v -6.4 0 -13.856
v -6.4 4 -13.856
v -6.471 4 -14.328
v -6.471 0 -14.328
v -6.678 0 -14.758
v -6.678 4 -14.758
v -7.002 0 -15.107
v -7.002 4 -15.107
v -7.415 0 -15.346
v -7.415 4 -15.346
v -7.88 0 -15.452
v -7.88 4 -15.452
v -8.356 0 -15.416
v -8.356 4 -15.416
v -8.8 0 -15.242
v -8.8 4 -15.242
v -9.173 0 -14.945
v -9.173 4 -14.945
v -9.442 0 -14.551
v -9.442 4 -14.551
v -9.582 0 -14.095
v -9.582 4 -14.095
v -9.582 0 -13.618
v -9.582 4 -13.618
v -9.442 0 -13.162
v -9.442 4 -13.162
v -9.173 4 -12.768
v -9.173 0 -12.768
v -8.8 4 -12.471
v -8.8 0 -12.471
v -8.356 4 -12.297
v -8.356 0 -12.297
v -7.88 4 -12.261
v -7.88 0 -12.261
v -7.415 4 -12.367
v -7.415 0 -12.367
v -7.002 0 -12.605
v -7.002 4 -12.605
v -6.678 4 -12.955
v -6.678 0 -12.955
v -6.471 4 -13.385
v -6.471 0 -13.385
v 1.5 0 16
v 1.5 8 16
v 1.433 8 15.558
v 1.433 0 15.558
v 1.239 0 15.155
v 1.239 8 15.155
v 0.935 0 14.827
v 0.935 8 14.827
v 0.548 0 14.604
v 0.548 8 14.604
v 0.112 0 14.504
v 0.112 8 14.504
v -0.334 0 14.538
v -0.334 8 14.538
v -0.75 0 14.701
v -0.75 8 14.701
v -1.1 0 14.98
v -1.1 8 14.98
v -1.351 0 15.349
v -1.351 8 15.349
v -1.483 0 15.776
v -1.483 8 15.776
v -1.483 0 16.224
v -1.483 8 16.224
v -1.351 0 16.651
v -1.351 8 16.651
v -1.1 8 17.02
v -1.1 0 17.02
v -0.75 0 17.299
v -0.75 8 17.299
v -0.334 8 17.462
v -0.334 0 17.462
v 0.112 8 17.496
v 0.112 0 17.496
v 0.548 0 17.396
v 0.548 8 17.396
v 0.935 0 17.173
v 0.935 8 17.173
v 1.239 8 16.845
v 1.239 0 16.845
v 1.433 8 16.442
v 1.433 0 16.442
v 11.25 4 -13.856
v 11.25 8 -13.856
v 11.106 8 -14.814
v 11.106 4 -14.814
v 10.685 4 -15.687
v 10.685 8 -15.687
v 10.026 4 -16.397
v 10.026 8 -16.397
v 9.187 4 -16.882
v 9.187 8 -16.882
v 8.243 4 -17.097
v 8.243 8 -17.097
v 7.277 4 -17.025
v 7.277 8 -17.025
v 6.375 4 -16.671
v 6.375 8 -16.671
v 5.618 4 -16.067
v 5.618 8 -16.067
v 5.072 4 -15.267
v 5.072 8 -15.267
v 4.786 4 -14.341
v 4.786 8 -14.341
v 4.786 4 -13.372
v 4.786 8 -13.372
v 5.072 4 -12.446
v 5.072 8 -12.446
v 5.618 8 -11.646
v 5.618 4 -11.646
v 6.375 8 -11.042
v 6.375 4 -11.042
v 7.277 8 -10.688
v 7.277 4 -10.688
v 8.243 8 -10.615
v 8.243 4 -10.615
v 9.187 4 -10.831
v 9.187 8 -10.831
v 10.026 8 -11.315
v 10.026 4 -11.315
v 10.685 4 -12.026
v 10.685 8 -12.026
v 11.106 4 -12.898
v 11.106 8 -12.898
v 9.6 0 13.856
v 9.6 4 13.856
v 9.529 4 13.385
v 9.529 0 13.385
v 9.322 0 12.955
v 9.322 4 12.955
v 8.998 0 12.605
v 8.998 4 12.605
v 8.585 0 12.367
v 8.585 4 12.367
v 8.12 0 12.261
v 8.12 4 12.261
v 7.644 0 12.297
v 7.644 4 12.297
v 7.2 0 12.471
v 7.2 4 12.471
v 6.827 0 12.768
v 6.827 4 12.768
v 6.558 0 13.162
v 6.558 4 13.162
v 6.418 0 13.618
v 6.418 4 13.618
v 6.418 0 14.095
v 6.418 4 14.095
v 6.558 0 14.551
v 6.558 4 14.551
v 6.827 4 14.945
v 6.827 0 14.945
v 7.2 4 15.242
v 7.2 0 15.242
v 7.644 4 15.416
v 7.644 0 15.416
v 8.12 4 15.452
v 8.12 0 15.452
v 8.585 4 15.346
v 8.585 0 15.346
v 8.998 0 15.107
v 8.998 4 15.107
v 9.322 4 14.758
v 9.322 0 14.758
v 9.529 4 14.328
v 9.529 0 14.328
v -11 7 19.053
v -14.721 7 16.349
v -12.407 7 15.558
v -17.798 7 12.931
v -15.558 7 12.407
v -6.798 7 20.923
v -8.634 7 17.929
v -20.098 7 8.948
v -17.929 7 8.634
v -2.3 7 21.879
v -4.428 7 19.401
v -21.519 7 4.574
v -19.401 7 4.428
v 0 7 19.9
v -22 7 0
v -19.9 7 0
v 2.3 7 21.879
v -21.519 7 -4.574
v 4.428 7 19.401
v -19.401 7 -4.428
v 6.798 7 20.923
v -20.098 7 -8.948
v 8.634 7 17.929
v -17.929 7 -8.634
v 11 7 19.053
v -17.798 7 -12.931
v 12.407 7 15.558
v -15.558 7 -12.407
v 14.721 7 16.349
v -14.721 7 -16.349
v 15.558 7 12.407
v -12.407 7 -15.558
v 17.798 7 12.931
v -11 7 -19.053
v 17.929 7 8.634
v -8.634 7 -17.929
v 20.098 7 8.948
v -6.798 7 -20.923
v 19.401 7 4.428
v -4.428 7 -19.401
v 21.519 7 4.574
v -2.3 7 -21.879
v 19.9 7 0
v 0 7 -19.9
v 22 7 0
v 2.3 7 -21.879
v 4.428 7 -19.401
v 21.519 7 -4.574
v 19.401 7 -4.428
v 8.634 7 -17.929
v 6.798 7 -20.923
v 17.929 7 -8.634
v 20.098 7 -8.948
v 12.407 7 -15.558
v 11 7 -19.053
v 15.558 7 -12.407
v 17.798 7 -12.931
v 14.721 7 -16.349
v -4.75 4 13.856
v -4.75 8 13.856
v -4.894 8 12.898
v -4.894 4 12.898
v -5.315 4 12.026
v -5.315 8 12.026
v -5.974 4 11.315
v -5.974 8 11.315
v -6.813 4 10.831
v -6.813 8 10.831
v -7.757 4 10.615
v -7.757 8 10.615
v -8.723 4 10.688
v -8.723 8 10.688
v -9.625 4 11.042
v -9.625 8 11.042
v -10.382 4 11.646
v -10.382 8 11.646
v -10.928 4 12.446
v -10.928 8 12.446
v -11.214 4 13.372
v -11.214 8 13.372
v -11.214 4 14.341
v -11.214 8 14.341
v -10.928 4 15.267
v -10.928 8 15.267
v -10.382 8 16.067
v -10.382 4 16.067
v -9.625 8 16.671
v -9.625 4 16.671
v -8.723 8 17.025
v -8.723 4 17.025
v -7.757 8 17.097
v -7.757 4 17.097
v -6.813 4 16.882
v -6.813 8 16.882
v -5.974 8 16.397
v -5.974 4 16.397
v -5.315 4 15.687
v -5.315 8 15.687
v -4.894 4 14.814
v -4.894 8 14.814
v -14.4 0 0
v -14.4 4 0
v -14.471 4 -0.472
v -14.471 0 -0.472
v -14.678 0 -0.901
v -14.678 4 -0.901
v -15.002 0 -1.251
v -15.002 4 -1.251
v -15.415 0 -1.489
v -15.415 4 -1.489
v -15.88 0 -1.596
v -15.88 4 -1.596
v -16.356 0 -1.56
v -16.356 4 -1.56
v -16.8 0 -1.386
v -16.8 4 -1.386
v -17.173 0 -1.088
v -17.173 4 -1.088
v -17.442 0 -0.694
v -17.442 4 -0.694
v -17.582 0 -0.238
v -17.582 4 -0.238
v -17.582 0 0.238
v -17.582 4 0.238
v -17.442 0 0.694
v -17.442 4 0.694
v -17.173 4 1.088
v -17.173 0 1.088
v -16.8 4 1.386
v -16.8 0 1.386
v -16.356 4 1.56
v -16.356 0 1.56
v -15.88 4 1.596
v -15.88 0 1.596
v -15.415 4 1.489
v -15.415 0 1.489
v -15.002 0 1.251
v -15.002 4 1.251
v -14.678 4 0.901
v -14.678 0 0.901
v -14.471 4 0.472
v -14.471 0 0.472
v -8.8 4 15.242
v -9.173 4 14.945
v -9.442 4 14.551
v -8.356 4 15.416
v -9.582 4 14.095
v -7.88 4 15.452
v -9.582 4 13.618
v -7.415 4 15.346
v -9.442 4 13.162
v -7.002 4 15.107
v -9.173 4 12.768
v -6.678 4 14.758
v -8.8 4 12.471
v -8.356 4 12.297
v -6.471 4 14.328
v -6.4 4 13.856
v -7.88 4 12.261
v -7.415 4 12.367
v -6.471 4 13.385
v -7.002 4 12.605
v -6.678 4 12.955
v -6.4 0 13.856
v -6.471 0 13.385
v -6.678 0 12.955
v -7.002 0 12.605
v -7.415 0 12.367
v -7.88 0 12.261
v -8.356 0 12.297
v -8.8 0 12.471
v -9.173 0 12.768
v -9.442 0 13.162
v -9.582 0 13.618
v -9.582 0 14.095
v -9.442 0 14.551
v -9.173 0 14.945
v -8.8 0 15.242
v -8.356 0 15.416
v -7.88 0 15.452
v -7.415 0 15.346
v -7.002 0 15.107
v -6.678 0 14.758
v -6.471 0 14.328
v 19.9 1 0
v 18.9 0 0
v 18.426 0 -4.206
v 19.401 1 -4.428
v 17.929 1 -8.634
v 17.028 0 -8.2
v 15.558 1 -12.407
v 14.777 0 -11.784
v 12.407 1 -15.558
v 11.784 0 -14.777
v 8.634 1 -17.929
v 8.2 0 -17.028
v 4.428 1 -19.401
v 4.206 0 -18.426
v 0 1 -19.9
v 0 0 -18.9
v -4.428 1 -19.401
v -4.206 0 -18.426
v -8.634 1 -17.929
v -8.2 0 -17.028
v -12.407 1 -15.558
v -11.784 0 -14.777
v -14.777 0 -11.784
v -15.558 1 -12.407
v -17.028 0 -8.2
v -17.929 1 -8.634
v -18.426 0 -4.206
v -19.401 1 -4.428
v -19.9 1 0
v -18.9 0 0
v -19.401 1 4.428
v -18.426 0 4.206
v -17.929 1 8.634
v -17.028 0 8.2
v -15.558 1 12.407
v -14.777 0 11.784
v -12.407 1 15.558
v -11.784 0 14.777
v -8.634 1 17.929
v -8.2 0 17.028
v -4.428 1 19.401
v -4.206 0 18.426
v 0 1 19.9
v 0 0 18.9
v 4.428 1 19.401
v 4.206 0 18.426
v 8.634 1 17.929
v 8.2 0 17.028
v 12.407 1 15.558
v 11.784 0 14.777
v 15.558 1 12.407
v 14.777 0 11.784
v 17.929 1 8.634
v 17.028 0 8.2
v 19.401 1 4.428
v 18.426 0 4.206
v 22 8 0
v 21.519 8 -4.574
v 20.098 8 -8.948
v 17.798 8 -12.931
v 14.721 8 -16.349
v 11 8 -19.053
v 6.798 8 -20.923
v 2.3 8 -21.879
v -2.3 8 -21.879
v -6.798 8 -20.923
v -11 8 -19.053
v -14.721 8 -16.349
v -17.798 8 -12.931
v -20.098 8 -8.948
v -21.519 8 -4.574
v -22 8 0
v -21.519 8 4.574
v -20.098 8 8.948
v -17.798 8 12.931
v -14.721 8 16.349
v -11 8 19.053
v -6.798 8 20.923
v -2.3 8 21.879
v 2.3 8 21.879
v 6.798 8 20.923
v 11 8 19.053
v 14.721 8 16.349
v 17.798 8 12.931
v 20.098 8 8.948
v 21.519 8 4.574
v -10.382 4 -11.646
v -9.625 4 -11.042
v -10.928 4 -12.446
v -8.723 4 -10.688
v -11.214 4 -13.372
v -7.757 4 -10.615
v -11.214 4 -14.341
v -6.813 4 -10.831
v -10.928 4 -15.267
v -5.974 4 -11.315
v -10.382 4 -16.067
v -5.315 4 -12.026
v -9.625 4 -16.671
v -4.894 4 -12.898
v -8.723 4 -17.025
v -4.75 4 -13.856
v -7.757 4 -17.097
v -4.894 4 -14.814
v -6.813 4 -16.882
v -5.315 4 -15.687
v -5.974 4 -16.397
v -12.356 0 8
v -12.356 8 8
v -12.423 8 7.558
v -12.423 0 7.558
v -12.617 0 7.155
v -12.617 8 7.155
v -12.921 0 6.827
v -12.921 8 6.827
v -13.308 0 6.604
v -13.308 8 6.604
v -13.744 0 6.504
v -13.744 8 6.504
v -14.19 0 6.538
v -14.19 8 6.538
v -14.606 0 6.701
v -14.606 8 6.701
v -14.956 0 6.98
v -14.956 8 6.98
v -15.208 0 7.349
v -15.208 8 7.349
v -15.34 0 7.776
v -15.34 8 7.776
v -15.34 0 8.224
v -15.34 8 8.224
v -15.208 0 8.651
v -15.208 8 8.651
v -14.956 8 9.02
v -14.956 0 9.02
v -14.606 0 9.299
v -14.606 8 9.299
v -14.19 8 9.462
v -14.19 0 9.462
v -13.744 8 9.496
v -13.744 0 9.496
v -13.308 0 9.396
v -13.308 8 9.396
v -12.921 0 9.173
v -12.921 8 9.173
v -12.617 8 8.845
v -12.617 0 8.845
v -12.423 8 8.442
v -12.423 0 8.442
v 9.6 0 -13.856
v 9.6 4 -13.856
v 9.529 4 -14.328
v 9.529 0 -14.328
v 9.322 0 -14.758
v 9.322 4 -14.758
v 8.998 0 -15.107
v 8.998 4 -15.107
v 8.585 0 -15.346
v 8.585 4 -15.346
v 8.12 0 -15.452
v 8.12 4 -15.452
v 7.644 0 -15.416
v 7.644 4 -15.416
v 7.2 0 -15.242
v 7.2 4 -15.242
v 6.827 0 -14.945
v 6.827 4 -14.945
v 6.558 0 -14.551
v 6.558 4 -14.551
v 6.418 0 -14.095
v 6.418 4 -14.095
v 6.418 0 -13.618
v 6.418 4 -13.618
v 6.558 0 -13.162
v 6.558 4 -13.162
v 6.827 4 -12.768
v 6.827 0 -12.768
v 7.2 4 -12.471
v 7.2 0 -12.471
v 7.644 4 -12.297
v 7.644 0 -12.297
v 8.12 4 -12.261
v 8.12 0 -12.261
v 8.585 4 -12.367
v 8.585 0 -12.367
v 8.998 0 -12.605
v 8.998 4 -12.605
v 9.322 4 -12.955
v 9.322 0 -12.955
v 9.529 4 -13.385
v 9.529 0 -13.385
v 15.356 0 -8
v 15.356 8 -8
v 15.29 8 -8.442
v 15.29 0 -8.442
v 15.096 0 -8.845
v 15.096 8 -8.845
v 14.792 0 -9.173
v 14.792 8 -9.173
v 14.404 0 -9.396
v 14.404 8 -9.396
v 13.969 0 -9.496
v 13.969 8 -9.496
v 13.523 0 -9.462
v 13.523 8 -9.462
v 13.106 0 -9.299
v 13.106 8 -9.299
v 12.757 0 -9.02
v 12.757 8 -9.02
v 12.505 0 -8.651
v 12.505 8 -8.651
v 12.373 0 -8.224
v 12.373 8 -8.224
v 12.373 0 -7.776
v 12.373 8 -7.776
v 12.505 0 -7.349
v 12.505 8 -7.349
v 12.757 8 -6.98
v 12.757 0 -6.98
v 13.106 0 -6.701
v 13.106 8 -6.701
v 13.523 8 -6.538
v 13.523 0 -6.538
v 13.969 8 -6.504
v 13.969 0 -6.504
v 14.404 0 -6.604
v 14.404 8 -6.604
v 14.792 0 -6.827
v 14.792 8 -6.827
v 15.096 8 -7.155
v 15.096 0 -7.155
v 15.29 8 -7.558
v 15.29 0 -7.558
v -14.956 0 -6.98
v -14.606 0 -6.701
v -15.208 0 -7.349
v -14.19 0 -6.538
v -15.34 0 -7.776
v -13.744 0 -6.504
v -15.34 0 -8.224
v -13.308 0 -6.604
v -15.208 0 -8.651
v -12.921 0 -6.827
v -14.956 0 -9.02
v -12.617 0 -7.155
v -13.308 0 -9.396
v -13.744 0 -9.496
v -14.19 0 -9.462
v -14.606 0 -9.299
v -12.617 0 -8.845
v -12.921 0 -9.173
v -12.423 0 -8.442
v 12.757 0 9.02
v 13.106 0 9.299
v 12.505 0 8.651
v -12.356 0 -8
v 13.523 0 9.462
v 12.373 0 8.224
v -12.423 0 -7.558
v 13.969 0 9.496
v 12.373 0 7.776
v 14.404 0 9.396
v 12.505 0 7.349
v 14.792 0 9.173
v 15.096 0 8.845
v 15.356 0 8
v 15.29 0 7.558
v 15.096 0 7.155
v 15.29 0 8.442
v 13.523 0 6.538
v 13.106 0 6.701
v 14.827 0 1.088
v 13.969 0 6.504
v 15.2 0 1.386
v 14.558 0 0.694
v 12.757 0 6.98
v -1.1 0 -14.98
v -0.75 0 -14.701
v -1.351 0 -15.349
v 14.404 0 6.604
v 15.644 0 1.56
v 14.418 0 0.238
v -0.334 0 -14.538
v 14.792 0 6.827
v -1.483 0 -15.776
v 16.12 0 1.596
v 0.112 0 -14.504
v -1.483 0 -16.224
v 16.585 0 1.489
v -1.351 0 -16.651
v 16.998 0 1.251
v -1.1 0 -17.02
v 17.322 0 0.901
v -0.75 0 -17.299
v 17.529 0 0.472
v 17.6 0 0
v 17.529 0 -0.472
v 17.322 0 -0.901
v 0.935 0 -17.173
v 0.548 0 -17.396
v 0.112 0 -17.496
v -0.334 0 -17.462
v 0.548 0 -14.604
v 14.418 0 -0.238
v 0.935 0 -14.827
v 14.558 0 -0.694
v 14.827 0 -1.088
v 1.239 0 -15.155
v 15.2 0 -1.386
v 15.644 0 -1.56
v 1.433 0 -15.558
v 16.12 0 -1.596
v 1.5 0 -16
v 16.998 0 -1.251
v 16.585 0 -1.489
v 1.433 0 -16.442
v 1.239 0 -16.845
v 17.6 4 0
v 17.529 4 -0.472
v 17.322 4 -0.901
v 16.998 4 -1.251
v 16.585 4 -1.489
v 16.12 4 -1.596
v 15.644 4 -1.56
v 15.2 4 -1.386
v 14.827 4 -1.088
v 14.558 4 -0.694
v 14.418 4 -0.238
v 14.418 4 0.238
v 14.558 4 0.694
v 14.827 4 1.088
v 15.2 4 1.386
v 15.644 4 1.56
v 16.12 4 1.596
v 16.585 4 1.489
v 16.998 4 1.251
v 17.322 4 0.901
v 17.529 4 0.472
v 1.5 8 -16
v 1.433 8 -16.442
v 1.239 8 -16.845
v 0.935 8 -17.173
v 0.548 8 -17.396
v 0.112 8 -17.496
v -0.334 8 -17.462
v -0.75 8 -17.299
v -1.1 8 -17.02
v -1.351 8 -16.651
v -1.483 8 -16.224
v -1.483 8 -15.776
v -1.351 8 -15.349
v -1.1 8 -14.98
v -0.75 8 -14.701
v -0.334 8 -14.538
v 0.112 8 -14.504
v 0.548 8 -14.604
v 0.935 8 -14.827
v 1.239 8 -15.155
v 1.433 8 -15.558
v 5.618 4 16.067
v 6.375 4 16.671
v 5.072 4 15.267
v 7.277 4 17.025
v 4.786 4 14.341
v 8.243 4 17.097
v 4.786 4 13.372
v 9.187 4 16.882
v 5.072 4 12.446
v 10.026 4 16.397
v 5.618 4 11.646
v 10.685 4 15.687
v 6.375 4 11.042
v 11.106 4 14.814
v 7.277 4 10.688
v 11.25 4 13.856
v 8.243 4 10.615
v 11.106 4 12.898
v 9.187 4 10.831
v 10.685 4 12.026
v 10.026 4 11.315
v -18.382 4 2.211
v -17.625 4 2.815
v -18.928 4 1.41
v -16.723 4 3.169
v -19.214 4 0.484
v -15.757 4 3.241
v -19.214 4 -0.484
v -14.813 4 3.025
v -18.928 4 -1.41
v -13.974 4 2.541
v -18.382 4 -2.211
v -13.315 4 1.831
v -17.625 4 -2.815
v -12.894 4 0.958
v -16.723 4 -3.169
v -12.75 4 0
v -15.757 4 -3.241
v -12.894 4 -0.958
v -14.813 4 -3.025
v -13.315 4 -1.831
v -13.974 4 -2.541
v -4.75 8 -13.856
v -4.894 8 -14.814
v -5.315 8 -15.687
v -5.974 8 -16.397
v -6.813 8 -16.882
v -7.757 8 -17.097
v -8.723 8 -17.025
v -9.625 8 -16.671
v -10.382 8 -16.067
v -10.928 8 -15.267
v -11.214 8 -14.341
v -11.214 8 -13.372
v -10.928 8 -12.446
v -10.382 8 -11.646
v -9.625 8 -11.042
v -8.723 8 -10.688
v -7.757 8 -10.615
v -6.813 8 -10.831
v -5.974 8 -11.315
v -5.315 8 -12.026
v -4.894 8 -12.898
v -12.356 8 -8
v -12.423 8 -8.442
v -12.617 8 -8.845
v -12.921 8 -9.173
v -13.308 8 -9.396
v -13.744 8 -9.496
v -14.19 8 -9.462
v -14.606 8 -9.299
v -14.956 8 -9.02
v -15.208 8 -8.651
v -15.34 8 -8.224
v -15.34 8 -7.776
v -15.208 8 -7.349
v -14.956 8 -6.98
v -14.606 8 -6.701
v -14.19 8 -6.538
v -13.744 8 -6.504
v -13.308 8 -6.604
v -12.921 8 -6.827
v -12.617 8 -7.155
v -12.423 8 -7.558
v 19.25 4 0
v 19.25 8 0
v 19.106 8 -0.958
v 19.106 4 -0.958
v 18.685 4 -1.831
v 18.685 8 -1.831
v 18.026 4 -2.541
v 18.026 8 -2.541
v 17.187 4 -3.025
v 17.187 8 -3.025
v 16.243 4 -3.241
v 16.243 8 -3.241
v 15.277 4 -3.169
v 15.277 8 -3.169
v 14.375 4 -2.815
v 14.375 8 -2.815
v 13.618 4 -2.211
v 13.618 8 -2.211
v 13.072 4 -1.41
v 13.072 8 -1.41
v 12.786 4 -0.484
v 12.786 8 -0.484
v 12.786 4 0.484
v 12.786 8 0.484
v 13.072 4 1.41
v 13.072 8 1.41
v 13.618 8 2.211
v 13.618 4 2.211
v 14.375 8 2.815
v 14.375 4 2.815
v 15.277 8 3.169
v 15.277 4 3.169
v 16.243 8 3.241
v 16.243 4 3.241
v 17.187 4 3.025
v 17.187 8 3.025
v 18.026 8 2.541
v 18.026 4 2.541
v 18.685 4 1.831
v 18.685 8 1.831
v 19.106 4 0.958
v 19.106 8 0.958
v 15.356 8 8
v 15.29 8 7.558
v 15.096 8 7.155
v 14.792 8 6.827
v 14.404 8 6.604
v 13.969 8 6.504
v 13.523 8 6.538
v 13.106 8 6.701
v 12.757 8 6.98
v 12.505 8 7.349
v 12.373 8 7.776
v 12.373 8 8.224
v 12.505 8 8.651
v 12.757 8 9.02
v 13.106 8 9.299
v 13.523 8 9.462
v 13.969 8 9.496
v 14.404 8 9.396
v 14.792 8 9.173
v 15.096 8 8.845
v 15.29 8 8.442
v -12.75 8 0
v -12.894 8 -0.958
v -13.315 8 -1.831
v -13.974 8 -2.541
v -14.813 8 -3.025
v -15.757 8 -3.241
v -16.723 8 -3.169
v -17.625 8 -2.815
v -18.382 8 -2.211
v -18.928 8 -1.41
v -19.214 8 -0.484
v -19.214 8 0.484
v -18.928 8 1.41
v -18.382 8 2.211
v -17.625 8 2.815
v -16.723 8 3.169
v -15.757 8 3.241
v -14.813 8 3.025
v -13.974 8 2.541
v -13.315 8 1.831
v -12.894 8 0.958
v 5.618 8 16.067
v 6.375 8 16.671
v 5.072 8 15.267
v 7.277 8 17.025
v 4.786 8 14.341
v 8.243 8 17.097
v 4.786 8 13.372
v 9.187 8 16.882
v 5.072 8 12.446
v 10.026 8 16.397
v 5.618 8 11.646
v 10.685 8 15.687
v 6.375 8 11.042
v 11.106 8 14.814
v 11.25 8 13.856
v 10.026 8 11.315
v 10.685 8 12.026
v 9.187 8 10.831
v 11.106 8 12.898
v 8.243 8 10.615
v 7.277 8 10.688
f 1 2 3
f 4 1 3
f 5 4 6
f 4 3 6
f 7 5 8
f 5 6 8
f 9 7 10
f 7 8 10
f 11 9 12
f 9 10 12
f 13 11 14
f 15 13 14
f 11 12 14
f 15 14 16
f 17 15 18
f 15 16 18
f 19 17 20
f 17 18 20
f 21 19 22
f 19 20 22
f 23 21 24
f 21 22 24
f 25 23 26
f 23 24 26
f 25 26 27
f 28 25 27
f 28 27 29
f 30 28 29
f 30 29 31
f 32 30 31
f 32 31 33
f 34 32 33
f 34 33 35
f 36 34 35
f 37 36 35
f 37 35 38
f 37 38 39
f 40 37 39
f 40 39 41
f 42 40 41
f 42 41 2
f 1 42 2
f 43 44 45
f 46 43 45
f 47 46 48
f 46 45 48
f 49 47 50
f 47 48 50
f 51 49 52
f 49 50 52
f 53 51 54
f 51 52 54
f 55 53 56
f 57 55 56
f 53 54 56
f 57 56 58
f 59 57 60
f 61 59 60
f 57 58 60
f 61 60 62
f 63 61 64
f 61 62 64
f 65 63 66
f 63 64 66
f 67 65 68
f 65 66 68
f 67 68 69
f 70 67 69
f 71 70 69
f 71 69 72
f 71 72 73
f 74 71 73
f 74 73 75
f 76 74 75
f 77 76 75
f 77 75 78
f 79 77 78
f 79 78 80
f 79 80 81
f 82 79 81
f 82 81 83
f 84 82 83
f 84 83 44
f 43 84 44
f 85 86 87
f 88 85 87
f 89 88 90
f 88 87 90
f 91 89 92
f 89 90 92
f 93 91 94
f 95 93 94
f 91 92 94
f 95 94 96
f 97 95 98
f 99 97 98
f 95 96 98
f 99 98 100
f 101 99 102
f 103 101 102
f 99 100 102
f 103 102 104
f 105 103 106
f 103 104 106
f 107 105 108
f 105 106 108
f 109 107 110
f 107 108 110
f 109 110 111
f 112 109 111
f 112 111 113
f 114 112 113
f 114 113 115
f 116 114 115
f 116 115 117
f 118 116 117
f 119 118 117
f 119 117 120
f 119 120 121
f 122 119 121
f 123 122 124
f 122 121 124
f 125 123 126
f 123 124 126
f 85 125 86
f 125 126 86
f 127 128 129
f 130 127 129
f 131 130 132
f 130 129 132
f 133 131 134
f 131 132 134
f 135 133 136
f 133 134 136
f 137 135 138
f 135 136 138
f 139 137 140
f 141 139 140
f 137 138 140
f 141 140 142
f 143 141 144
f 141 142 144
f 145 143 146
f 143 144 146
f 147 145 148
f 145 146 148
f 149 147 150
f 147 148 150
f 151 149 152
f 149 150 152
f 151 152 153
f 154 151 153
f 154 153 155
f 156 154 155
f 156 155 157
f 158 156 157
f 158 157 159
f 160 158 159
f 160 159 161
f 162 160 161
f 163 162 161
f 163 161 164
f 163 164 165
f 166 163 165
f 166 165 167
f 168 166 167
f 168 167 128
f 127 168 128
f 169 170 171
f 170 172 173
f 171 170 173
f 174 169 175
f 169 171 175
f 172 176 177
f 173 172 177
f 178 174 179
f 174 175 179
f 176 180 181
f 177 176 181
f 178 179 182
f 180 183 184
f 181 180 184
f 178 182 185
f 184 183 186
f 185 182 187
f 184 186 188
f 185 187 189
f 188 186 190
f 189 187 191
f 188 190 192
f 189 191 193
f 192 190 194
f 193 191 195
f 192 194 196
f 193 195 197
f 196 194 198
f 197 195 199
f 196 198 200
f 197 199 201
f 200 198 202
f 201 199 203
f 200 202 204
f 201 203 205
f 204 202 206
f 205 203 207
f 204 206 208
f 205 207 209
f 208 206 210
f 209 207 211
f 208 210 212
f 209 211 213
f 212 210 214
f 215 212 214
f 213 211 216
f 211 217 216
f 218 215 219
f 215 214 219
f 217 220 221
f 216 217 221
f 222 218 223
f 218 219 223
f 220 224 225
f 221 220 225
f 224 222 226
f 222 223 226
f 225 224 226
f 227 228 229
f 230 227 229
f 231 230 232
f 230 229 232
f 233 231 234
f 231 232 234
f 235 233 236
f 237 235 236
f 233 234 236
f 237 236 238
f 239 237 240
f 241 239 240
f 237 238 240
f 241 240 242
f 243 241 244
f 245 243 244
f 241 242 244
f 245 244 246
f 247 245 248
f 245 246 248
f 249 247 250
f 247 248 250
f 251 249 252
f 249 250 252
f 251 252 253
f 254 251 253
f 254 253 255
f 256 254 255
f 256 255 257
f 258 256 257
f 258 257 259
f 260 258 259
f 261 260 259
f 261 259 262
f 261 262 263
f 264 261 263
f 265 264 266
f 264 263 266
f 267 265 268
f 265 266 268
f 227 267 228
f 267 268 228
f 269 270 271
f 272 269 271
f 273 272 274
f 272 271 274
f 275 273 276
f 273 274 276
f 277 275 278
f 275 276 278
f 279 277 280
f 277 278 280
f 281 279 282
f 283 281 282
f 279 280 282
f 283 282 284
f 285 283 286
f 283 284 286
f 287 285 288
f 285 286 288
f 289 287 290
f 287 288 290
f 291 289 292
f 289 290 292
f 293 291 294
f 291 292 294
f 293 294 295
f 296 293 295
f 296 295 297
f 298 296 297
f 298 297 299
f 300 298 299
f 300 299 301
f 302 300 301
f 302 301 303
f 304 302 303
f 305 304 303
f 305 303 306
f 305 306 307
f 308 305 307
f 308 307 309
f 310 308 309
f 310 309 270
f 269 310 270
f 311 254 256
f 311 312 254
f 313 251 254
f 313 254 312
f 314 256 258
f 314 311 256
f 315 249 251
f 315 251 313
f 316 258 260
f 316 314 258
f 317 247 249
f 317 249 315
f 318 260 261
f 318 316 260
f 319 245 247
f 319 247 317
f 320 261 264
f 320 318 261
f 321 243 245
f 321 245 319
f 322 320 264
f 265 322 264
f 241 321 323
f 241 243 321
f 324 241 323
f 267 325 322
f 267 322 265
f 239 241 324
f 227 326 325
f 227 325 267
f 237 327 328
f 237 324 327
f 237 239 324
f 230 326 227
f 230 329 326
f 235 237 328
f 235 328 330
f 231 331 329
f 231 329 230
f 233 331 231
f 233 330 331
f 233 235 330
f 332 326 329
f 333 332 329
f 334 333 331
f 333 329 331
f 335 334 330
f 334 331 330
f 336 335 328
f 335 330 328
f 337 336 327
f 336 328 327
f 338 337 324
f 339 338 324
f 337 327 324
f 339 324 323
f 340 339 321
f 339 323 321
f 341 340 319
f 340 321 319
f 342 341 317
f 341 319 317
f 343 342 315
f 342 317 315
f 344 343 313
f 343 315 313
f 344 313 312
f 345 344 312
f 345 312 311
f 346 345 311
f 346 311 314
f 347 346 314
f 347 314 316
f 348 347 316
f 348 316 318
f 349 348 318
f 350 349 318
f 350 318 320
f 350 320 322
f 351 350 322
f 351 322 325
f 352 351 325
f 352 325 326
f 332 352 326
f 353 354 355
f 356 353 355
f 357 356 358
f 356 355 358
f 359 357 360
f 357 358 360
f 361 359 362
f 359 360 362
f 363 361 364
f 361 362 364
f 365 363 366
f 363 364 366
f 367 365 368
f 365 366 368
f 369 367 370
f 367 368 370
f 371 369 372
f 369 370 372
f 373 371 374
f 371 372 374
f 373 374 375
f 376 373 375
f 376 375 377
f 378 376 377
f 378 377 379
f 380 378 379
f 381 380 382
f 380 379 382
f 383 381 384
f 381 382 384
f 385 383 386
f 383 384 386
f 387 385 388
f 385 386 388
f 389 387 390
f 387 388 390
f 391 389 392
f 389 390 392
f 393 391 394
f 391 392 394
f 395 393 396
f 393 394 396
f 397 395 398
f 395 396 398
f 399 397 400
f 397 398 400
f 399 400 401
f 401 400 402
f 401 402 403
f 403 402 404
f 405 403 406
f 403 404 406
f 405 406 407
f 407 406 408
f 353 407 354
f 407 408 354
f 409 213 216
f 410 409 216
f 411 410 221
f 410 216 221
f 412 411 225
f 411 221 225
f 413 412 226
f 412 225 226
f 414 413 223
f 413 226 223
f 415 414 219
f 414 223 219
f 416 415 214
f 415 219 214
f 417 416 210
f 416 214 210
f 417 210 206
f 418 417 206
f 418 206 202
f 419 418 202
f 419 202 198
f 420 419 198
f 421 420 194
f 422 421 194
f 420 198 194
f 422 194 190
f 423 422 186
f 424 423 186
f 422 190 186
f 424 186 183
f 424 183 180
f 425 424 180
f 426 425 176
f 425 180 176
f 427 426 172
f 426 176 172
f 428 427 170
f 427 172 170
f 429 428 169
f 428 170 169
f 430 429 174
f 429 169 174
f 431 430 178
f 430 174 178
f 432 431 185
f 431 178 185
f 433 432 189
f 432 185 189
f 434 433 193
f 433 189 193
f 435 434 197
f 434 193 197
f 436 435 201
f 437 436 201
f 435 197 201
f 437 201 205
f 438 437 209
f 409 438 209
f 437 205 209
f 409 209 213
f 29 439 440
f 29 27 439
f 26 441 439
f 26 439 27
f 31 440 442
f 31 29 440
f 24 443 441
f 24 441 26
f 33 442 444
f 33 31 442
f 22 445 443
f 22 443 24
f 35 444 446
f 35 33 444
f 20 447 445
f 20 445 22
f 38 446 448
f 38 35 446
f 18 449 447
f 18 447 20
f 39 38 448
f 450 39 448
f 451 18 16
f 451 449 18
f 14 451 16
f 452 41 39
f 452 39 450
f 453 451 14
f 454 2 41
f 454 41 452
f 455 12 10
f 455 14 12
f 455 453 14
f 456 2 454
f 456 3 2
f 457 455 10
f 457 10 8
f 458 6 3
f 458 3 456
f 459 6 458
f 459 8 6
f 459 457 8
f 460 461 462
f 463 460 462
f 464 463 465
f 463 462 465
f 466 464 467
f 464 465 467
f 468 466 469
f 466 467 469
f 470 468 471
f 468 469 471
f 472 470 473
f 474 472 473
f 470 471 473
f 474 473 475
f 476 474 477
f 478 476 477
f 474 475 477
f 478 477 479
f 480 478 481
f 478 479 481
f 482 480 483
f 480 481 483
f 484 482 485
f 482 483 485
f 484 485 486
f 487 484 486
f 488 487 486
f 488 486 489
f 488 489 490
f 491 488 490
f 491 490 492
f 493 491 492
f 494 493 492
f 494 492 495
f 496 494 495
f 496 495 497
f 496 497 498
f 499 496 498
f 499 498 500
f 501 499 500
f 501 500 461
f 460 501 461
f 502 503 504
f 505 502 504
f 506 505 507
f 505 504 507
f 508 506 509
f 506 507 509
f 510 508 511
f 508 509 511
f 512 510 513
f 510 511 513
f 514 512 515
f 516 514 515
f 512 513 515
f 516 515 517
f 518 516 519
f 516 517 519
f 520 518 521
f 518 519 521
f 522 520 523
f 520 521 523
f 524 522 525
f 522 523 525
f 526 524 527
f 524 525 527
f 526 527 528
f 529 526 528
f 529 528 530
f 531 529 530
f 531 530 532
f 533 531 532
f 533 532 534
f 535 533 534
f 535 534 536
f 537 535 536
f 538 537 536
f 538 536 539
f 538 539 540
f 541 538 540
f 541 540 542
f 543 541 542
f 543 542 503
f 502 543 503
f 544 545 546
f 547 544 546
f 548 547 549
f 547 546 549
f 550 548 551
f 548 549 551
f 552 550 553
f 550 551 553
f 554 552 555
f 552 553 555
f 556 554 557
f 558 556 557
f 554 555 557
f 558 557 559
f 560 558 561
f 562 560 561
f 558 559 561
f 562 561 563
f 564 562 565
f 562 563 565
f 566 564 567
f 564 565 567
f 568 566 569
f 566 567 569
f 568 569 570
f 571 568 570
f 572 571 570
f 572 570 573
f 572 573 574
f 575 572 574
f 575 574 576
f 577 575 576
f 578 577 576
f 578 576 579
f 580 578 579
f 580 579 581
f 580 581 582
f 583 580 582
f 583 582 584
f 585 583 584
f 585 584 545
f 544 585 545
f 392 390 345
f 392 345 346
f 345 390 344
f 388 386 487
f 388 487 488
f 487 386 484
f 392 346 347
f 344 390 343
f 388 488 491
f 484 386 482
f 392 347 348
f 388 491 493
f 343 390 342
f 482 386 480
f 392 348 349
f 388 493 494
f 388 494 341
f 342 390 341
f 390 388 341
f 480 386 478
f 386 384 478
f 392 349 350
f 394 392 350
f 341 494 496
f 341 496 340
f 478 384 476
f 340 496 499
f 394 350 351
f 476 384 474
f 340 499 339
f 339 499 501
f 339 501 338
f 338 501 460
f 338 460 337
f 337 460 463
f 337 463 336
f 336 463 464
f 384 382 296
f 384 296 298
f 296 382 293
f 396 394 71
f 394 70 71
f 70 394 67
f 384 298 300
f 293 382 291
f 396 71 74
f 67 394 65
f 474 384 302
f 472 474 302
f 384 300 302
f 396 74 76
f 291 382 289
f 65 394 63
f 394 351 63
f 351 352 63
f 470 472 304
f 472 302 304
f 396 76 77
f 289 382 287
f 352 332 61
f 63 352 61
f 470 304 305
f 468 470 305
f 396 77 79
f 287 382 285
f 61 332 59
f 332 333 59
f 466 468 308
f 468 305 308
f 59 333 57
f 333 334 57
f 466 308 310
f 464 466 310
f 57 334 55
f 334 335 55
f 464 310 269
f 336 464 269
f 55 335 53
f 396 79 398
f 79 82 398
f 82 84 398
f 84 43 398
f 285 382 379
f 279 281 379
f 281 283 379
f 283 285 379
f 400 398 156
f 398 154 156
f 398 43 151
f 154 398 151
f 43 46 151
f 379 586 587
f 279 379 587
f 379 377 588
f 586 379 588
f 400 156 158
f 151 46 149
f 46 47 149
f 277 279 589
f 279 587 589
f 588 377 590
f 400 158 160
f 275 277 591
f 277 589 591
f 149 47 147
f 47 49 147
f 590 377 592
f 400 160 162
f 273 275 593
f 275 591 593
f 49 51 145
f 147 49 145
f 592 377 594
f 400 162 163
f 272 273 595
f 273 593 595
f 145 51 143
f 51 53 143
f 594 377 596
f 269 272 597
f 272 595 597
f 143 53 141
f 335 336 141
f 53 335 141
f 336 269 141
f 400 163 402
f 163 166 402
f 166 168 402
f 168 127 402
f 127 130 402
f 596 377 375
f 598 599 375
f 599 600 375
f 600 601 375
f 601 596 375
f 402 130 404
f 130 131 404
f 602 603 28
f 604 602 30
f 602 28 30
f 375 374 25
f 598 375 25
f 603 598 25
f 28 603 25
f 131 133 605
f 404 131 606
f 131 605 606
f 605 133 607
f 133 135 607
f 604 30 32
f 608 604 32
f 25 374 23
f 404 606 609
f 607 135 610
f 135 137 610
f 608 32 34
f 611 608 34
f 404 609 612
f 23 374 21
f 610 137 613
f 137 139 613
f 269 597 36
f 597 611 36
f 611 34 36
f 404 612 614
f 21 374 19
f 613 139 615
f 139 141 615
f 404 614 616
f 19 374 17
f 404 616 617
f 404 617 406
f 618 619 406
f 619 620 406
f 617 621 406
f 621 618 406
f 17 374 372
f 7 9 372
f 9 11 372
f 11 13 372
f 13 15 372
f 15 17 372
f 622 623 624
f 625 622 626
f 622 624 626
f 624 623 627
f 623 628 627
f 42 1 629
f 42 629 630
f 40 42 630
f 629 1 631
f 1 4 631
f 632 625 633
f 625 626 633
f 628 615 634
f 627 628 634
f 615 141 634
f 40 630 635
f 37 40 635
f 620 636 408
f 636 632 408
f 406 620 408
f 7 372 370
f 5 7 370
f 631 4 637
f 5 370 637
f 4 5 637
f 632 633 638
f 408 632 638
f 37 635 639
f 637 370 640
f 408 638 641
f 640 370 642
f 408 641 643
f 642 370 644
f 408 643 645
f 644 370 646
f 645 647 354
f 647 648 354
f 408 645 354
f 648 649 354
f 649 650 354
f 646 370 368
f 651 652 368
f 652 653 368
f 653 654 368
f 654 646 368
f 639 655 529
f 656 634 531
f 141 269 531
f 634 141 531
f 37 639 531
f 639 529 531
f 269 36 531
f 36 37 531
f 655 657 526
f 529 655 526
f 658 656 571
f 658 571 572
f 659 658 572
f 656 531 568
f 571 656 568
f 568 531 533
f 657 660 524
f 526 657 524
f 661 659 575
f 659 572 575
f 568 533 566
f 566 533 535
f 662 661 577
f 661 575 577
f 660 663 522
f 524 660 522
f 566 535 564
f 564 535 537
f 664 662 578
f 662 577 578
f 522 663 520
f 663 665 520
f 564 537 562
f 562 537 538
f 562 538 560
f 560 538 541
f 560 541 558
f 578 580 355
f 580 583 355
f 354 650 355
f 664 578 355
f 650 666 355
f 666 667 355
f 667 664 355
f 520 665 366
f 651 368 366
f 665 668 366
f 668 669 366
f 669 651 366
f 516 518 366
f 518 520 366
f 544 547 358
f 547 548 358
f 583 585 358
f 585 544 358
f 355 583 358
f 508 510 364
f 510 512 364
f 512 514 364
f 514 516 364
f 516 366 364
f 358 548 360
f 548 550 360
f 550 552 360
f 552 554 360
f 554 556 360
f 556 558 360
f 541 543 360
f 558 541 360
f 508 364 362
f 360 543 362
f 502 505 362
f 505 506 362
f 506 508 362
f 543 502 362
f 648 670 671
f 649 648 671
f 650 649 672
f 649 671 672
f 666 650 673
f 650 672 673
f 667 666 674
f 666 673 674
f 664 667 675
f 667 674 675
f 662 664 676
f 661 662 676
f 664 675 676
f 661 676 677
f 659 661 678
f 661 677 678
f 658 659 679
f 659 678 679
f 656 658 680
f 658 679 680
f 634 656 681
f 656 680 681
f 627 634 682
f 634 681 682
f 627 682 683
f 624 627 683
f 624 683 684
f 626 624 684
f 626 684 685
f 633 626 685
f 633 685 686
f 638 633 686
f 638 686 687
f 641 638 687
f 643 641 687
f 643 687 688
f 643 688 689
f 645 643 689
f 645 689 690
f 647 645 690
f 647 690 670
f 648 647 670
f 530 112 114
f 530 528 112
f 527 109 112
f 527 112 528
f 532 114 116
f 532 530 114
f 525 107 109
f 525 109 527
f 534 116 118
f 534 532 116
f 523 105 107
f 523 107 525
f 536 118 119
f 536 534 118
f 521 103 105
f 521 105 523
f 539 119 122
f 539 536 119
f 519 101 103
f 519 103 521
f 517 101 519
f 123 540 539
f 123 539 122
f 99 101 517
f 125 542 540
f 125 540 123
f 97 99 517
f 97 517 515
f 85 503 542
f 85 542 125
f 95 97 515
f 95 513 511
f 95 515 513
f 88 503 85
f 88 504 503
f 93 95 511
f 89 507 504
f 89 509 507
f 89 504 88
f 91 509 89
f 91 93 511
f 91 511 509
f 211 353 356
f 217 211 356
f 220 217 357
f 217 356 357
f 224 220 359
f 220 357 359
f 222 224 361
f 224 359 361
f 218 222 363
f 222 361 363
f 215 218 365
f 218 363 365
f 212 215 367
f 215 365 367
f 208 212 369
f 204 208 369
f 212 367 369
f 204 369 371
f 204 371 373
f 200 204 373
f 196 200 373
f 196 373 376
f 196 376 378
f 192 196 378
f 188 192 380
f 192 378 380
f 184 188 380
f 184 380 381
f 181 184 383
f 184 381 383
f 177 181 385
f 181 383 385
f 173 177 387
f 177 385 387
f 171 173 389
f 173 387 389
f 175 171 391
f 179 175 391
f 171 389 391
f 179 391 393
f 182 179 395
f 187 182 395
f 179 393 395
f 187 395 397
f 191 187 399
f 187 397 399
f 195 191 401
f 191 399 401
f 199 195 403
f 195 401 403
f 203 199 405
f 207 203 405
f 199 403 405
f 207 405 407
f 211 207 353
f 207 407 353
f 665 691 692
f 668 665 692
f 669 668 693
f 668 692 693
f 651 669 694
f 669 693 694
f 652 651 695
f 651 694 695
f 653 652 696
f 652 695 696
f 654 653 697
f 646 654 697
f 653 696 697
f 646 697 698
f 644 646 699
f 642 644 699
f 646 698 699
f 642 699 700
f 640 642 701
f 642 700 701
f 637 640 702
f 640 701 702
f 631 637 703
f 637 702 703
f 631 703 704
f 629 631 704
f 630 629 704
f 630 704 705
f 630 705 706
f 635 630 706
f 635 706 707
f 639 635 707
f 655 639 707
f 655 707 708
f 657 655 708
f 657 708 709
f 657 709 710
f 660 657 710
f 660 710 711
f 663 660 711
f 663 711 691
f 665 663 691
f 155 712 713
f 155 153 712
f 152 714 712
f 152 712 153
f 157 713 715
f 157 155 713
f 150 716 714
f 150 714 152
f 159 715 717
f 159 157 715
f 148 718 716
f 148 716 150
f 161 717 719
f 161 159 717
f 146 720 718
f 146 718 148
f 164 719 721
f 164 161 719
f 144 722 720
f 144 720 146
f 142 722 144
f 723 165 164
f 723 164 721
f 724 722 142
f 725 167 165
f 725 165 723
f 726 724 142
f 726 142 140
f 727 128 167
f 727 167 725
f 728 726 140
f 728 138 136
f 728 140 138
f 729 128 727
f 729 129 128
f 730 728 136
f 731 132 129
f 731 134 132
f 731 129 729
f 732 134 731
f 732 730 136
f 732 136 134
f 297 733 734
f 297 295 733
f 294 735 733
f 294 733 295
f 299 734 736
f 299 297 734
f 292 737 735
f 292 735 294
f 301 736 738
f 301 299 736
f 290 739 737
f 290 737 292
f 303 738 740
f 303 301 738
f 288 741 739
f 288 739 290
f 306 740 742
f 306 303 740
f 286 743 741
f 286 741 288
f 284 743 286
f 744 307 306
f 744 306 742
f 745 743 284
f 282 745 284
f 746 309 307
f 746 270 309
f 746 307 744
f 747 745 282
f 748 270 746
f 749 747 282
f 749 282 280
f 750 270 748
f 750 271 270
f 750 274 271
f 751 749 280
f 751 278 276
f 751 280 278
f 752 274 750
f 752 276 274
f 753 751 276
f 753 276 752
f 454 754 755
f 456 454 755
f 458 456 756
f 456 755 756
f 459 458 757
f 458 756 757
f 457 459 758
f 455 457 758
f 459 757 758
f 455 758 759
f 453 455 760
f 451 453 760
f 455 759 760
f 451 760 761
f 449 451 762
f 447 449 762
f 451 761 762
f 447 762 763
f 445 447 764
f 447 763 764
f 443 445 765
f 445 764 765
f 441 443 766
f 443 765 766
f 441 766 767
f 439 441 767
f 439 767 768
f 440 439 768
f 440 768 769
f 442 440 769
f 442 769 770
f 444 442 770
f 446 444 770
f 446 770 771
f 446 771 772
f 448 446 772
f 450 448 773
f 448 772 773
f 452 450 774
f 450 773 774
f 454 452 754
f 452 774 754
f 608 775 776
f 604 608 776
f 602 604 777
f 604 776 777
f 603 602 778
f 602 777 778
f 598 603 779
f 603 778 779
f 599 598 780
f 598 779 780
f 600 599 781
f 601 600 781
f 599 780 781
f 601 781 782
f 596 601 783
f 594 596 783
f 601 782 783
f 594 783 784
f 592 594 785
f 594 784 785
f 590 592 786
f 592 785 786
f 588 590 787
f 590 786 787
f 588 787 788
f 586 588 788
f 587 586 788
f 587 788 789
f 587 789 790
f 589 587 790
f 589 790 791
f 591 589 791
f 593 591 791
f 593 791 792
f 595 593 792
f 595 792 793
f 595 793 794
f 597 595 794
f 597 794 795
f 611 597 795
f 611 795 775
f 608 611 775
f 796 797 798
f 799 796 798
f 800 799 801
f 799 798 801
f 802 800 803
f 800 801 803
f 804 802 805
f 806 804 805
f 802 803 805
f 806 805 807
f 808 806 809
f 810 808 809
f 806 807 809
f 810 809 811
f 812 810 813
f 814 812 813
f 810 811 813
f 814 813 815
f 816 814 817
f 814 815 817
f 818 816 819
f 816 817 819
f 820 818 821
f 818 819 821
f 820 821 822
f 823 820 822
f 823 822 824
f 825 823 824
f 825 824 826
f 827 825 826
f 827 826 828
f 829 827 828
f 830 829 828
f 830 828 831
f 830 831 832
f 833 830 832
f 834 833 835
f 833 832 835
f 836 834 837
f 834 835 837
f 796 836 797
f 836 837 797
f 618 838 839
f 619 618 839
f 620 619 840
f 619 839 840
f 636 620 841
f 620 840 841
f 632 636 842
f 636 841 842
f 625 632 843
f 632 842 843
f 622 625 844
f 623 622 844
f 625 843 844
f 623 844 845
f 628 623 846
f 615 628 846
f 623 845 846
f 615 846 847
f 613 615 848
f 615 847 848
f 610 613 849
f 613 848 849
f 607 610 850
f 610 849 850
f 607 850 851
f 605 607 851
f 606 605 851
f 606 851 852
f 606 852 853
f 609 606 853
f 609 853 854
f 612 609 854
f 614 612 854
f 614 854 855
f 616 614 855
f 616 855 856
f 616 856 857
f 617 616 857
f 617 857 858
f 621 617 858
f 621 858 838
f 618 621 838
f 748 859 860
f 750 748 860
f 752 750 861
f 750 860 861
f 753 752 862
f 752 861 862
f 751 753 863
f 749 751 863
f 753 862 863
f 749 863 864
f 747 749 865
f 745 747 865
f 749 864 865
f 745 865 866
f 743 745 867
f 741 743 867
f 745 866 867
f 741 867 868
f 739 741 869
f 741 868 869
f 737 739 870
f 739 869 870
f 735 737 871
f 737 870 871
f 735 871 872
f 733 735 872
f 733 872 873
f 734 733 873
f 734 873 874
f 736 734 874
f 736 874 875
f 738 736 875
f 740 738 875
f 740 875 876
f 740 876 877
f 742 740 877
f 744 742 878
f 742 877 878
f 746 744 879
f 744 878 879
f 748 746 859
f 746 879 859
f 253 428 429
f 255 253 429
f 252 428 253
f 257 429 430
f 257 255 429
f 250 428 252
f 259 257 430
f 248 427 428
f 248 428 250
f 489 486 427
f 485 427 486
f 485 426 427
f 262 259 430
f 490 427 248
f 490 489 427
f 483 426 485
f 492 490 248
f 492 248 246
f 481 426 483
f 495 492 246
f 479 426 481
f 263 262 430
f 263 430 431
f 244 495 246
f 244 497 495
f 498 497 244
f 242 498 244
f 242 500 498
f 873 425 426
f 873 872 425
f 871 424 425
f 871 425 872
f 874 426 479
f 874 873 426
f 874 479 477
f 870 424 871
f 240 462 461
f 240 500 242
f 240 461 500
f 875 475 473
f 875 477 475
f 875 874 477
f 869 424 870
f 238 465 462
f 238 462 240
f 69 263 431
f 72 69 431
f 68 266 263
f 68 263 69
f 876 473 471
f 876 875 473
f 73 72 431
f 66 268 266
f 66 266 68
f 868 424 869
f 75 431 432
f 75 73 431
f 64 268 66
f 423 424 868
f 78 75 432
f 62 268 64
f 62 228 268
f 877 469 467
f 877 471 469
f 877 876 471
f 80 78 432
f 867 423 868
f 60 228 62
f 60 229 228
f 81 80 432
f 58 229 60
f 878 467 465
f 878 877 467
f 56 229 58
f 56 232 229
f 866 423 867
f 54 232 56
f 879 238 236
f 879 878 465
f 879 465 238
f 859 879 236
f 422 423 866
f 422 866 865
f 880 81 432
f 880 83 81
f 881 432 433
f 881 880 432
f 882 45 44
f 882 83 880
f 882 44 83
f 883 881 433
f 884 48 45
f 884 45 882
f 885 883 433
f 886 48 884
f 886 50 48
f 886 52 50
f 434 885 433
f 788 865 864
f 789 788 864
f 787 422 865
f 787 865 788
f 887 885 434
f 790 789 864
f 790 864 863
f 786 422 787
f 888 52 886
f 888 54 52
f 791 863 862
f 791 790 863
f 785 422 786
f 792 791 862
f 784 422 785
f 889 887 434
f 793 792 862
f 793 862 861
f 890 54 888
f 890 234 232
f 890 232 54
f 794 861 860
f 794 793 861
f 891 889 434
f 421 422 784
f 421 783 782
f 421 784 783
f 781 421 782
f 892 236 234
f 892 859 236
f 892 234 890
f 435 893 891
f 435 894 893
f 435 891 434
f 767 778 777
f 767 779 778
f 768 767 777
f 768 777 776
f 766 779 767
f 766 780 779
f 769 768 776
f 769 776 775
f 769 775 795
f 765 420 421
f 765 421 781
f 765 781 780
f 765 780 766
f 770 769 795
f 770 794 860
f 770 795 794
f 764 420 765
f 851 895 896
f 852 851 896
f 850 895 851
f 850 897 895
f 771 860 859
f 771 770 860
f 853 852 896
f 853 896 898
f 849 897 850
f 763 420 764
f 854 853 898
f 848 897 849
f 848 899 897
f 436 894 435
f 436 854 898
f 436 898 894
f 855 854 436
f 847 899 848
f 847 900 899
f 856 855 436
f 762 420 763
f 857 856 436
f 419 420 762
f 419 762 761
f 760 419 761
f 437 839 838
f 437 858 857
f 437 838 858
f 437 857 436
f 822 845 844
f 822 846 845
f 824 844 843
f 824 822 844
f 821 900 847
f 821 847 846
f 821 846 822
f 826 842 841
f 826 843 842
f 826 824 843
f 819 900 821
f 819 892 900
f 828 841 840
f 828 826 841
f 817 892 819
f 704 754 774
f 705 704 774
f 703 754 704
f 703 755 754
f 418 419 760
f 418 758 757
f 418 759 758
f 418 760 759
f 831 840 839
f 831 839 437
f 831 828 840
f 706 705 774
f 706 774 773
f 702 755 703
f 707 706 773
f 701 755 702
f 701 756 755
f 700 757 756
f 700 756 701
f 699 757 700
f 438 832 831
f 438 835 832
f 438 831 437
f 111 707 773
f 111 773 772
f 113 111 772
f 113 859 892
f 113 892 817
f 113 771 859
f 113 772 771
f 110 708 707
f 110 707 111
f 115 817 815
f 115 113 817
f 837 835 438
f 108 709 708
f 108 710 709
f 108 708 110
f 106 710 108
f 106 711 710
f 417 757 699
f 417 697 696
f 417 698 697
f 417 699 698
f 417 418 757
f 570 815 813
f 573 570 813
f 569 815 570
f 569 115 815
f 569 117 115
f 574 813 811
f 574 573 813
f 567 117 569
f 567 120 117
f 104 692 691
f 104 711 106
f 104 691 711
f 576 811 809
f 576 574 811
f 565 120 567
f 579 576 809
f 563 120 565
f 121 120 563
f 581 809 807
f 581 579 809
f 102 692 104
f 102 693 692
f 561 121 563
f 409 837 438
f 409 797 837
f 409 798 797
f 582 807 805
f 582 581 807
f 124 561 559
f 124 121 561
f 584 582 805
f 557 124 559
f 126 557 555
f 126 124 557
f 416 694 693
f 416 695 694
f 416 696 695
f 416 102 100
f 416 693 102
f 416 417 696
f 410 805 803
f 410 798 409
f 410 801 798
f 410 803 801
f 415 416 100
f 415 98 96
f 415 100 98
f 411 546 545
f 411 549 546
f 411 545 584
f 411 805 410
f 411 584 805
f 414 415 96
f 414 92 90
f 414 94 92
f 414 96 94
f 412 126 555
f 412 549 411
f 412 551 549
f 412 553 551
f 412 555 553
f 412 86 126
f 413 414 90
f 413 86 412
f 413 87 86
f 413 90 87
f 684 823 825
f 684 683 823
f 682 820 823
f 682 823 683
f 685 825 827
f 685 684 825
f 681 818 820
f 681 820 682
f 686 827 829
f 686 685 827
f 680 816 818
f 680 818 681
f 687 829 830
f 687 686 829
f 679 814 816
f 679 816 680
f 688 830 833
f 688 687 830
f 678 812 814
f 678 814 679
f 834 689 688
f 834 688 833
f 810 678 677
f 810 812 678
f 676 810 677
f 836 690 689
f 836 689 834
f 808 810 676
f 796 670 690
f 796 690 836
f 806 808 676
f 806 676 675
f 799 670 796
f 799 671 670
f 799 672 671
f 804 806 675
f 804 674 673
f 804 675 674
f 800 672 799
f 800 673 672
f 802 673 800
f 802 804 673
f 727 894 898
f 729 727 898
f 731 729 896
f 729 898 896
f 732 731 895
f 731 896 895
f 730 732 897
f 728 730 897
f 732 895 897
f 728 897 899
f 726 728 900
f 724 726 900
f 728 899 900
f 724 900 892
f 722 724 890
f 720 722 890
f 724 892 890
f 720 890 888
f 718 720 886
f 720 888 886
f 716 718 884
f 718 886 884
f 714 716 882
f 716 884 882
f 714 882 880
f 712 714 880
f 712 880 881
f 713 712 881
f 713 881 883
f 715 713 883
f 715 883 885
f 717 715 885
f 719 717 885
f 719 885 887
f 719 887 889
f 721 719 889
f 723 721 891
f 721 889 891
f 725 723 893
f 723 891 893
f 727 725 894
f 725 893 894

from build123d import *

# Parameters (mm, degrees)
SKETCH1_R           = 19.9
BOSS_EXTRUDE1_DEPTH = 7
SKETCH2_R           = 22
BOSS_EXTRUDE2_DEPTH = 1
SKETCH3_R           = 1.5
SKETCH3_R_2         = 1.6
CUT_EXTRUDE1_DEPTH  = 9
SKETCH4_R           = 3.25
CUT_EXTRUDE2_DEPTH  = 4
CHAMFER1_SIZE       = 1


with BuildPart() as part:
    # Sketch1 → Boss-Extrude1 (new body)
    with BuildSketch(Plane(origin=(0, 0, 0), x_dir=(1, 0, 0), z_dir=(0, 1, 0))):
        Circle(SKETCH1_R)
    extrude(amount=BOSS_EXTRUDE1_DEPTH)

    # Sketch2 → Boss-Extrude2 (add)
    with BuildSketch(Plane(origin=(0, 7, 0), x_dir=(1, 0, 0), z_dir=(0, 1, 0))):
        Circle(SKETCH2_R)
    extrude(amount=BOSS_EXTRUDE2_DEPTH)

    # Sketch3 → Cut-Extrude1 (cut, through all)
    with BuildSketch(Plane(origin=(0, 8, 0), x_dir=(1, 0, 0), z_dir=(0, 1, 0))):
        with Locations((0, 16)):
            Circle(SKETCH3_R)
        with Locations((13.856406461, 8)):
            Circle(SKETCH3_R)
        with Locations((13.856406461, -8)):
            Circle(SKETCH3_R)
        with Locations((0, -16)):
            Circle(SKETCH3_R)
        with Locations((-13.856406461, -8)):
            Circle(SKETCH3_R)
        with Locations((-13.856406461, 8)):
            Circle(SKETCH3_R)
        with Locations((-8, 13.856406461)):
            Circle(SKETCH3_R_2)
        with Locations((-16, 0)):
            Circle(SKETCH3_R_2)
        with Locations((-8, -13.856406461)):
            Circle(SKETCH3_R_2)
        with Locations((8, -13.856406461)):
            Circle(SKETCH3_R_2)
        with Locations((16, 0)):
            Circle(SKETCH3_R_2)
        with Locations((8, 13.856406461)):
            Circle(SKETCH3_R_2)
    extrude(amount=-CUT_EXTRUDE1_DEPTH, mode=Mode.SUBTRACT)

    # Sketch4 → Cut-Extrude2 (cut)
    with BuildSketch(Plane(origin=(0, 8, 0), x_dir=(1, 0, 0), z_dir=(0, 1, 0))):
        with Locations((-8, 13.856406461)):
            Circle(SKETCH4_R)
        with Locations((8, 13.856406461)):
            Circle(SKETCH4_R)
        with Locations((16, 0)):
            Circle(SKETCH4_R)
        with Locations((8, -13.856406461)):
            Circle(SKETCH4_R)
        with Locations((-8, -13.856406461)):
            Circle(SKETCH4_R)
        with Locations((-16, 0)):
            Circle(SKETCH4_R)
    extrude(amount=-CUT_EXTRUDE2_DEPTH, mode=Mode.SUBTRACT)

    # Chamfer1
    chamfer1_edges = [part.edges().sort_by_distance(p)[0] for p in [
        (-19.9, 0, 0),
    ]]
    chamfer(chamfer1_edges, length=CHAMFER1_SIZE)


solid = part.part
